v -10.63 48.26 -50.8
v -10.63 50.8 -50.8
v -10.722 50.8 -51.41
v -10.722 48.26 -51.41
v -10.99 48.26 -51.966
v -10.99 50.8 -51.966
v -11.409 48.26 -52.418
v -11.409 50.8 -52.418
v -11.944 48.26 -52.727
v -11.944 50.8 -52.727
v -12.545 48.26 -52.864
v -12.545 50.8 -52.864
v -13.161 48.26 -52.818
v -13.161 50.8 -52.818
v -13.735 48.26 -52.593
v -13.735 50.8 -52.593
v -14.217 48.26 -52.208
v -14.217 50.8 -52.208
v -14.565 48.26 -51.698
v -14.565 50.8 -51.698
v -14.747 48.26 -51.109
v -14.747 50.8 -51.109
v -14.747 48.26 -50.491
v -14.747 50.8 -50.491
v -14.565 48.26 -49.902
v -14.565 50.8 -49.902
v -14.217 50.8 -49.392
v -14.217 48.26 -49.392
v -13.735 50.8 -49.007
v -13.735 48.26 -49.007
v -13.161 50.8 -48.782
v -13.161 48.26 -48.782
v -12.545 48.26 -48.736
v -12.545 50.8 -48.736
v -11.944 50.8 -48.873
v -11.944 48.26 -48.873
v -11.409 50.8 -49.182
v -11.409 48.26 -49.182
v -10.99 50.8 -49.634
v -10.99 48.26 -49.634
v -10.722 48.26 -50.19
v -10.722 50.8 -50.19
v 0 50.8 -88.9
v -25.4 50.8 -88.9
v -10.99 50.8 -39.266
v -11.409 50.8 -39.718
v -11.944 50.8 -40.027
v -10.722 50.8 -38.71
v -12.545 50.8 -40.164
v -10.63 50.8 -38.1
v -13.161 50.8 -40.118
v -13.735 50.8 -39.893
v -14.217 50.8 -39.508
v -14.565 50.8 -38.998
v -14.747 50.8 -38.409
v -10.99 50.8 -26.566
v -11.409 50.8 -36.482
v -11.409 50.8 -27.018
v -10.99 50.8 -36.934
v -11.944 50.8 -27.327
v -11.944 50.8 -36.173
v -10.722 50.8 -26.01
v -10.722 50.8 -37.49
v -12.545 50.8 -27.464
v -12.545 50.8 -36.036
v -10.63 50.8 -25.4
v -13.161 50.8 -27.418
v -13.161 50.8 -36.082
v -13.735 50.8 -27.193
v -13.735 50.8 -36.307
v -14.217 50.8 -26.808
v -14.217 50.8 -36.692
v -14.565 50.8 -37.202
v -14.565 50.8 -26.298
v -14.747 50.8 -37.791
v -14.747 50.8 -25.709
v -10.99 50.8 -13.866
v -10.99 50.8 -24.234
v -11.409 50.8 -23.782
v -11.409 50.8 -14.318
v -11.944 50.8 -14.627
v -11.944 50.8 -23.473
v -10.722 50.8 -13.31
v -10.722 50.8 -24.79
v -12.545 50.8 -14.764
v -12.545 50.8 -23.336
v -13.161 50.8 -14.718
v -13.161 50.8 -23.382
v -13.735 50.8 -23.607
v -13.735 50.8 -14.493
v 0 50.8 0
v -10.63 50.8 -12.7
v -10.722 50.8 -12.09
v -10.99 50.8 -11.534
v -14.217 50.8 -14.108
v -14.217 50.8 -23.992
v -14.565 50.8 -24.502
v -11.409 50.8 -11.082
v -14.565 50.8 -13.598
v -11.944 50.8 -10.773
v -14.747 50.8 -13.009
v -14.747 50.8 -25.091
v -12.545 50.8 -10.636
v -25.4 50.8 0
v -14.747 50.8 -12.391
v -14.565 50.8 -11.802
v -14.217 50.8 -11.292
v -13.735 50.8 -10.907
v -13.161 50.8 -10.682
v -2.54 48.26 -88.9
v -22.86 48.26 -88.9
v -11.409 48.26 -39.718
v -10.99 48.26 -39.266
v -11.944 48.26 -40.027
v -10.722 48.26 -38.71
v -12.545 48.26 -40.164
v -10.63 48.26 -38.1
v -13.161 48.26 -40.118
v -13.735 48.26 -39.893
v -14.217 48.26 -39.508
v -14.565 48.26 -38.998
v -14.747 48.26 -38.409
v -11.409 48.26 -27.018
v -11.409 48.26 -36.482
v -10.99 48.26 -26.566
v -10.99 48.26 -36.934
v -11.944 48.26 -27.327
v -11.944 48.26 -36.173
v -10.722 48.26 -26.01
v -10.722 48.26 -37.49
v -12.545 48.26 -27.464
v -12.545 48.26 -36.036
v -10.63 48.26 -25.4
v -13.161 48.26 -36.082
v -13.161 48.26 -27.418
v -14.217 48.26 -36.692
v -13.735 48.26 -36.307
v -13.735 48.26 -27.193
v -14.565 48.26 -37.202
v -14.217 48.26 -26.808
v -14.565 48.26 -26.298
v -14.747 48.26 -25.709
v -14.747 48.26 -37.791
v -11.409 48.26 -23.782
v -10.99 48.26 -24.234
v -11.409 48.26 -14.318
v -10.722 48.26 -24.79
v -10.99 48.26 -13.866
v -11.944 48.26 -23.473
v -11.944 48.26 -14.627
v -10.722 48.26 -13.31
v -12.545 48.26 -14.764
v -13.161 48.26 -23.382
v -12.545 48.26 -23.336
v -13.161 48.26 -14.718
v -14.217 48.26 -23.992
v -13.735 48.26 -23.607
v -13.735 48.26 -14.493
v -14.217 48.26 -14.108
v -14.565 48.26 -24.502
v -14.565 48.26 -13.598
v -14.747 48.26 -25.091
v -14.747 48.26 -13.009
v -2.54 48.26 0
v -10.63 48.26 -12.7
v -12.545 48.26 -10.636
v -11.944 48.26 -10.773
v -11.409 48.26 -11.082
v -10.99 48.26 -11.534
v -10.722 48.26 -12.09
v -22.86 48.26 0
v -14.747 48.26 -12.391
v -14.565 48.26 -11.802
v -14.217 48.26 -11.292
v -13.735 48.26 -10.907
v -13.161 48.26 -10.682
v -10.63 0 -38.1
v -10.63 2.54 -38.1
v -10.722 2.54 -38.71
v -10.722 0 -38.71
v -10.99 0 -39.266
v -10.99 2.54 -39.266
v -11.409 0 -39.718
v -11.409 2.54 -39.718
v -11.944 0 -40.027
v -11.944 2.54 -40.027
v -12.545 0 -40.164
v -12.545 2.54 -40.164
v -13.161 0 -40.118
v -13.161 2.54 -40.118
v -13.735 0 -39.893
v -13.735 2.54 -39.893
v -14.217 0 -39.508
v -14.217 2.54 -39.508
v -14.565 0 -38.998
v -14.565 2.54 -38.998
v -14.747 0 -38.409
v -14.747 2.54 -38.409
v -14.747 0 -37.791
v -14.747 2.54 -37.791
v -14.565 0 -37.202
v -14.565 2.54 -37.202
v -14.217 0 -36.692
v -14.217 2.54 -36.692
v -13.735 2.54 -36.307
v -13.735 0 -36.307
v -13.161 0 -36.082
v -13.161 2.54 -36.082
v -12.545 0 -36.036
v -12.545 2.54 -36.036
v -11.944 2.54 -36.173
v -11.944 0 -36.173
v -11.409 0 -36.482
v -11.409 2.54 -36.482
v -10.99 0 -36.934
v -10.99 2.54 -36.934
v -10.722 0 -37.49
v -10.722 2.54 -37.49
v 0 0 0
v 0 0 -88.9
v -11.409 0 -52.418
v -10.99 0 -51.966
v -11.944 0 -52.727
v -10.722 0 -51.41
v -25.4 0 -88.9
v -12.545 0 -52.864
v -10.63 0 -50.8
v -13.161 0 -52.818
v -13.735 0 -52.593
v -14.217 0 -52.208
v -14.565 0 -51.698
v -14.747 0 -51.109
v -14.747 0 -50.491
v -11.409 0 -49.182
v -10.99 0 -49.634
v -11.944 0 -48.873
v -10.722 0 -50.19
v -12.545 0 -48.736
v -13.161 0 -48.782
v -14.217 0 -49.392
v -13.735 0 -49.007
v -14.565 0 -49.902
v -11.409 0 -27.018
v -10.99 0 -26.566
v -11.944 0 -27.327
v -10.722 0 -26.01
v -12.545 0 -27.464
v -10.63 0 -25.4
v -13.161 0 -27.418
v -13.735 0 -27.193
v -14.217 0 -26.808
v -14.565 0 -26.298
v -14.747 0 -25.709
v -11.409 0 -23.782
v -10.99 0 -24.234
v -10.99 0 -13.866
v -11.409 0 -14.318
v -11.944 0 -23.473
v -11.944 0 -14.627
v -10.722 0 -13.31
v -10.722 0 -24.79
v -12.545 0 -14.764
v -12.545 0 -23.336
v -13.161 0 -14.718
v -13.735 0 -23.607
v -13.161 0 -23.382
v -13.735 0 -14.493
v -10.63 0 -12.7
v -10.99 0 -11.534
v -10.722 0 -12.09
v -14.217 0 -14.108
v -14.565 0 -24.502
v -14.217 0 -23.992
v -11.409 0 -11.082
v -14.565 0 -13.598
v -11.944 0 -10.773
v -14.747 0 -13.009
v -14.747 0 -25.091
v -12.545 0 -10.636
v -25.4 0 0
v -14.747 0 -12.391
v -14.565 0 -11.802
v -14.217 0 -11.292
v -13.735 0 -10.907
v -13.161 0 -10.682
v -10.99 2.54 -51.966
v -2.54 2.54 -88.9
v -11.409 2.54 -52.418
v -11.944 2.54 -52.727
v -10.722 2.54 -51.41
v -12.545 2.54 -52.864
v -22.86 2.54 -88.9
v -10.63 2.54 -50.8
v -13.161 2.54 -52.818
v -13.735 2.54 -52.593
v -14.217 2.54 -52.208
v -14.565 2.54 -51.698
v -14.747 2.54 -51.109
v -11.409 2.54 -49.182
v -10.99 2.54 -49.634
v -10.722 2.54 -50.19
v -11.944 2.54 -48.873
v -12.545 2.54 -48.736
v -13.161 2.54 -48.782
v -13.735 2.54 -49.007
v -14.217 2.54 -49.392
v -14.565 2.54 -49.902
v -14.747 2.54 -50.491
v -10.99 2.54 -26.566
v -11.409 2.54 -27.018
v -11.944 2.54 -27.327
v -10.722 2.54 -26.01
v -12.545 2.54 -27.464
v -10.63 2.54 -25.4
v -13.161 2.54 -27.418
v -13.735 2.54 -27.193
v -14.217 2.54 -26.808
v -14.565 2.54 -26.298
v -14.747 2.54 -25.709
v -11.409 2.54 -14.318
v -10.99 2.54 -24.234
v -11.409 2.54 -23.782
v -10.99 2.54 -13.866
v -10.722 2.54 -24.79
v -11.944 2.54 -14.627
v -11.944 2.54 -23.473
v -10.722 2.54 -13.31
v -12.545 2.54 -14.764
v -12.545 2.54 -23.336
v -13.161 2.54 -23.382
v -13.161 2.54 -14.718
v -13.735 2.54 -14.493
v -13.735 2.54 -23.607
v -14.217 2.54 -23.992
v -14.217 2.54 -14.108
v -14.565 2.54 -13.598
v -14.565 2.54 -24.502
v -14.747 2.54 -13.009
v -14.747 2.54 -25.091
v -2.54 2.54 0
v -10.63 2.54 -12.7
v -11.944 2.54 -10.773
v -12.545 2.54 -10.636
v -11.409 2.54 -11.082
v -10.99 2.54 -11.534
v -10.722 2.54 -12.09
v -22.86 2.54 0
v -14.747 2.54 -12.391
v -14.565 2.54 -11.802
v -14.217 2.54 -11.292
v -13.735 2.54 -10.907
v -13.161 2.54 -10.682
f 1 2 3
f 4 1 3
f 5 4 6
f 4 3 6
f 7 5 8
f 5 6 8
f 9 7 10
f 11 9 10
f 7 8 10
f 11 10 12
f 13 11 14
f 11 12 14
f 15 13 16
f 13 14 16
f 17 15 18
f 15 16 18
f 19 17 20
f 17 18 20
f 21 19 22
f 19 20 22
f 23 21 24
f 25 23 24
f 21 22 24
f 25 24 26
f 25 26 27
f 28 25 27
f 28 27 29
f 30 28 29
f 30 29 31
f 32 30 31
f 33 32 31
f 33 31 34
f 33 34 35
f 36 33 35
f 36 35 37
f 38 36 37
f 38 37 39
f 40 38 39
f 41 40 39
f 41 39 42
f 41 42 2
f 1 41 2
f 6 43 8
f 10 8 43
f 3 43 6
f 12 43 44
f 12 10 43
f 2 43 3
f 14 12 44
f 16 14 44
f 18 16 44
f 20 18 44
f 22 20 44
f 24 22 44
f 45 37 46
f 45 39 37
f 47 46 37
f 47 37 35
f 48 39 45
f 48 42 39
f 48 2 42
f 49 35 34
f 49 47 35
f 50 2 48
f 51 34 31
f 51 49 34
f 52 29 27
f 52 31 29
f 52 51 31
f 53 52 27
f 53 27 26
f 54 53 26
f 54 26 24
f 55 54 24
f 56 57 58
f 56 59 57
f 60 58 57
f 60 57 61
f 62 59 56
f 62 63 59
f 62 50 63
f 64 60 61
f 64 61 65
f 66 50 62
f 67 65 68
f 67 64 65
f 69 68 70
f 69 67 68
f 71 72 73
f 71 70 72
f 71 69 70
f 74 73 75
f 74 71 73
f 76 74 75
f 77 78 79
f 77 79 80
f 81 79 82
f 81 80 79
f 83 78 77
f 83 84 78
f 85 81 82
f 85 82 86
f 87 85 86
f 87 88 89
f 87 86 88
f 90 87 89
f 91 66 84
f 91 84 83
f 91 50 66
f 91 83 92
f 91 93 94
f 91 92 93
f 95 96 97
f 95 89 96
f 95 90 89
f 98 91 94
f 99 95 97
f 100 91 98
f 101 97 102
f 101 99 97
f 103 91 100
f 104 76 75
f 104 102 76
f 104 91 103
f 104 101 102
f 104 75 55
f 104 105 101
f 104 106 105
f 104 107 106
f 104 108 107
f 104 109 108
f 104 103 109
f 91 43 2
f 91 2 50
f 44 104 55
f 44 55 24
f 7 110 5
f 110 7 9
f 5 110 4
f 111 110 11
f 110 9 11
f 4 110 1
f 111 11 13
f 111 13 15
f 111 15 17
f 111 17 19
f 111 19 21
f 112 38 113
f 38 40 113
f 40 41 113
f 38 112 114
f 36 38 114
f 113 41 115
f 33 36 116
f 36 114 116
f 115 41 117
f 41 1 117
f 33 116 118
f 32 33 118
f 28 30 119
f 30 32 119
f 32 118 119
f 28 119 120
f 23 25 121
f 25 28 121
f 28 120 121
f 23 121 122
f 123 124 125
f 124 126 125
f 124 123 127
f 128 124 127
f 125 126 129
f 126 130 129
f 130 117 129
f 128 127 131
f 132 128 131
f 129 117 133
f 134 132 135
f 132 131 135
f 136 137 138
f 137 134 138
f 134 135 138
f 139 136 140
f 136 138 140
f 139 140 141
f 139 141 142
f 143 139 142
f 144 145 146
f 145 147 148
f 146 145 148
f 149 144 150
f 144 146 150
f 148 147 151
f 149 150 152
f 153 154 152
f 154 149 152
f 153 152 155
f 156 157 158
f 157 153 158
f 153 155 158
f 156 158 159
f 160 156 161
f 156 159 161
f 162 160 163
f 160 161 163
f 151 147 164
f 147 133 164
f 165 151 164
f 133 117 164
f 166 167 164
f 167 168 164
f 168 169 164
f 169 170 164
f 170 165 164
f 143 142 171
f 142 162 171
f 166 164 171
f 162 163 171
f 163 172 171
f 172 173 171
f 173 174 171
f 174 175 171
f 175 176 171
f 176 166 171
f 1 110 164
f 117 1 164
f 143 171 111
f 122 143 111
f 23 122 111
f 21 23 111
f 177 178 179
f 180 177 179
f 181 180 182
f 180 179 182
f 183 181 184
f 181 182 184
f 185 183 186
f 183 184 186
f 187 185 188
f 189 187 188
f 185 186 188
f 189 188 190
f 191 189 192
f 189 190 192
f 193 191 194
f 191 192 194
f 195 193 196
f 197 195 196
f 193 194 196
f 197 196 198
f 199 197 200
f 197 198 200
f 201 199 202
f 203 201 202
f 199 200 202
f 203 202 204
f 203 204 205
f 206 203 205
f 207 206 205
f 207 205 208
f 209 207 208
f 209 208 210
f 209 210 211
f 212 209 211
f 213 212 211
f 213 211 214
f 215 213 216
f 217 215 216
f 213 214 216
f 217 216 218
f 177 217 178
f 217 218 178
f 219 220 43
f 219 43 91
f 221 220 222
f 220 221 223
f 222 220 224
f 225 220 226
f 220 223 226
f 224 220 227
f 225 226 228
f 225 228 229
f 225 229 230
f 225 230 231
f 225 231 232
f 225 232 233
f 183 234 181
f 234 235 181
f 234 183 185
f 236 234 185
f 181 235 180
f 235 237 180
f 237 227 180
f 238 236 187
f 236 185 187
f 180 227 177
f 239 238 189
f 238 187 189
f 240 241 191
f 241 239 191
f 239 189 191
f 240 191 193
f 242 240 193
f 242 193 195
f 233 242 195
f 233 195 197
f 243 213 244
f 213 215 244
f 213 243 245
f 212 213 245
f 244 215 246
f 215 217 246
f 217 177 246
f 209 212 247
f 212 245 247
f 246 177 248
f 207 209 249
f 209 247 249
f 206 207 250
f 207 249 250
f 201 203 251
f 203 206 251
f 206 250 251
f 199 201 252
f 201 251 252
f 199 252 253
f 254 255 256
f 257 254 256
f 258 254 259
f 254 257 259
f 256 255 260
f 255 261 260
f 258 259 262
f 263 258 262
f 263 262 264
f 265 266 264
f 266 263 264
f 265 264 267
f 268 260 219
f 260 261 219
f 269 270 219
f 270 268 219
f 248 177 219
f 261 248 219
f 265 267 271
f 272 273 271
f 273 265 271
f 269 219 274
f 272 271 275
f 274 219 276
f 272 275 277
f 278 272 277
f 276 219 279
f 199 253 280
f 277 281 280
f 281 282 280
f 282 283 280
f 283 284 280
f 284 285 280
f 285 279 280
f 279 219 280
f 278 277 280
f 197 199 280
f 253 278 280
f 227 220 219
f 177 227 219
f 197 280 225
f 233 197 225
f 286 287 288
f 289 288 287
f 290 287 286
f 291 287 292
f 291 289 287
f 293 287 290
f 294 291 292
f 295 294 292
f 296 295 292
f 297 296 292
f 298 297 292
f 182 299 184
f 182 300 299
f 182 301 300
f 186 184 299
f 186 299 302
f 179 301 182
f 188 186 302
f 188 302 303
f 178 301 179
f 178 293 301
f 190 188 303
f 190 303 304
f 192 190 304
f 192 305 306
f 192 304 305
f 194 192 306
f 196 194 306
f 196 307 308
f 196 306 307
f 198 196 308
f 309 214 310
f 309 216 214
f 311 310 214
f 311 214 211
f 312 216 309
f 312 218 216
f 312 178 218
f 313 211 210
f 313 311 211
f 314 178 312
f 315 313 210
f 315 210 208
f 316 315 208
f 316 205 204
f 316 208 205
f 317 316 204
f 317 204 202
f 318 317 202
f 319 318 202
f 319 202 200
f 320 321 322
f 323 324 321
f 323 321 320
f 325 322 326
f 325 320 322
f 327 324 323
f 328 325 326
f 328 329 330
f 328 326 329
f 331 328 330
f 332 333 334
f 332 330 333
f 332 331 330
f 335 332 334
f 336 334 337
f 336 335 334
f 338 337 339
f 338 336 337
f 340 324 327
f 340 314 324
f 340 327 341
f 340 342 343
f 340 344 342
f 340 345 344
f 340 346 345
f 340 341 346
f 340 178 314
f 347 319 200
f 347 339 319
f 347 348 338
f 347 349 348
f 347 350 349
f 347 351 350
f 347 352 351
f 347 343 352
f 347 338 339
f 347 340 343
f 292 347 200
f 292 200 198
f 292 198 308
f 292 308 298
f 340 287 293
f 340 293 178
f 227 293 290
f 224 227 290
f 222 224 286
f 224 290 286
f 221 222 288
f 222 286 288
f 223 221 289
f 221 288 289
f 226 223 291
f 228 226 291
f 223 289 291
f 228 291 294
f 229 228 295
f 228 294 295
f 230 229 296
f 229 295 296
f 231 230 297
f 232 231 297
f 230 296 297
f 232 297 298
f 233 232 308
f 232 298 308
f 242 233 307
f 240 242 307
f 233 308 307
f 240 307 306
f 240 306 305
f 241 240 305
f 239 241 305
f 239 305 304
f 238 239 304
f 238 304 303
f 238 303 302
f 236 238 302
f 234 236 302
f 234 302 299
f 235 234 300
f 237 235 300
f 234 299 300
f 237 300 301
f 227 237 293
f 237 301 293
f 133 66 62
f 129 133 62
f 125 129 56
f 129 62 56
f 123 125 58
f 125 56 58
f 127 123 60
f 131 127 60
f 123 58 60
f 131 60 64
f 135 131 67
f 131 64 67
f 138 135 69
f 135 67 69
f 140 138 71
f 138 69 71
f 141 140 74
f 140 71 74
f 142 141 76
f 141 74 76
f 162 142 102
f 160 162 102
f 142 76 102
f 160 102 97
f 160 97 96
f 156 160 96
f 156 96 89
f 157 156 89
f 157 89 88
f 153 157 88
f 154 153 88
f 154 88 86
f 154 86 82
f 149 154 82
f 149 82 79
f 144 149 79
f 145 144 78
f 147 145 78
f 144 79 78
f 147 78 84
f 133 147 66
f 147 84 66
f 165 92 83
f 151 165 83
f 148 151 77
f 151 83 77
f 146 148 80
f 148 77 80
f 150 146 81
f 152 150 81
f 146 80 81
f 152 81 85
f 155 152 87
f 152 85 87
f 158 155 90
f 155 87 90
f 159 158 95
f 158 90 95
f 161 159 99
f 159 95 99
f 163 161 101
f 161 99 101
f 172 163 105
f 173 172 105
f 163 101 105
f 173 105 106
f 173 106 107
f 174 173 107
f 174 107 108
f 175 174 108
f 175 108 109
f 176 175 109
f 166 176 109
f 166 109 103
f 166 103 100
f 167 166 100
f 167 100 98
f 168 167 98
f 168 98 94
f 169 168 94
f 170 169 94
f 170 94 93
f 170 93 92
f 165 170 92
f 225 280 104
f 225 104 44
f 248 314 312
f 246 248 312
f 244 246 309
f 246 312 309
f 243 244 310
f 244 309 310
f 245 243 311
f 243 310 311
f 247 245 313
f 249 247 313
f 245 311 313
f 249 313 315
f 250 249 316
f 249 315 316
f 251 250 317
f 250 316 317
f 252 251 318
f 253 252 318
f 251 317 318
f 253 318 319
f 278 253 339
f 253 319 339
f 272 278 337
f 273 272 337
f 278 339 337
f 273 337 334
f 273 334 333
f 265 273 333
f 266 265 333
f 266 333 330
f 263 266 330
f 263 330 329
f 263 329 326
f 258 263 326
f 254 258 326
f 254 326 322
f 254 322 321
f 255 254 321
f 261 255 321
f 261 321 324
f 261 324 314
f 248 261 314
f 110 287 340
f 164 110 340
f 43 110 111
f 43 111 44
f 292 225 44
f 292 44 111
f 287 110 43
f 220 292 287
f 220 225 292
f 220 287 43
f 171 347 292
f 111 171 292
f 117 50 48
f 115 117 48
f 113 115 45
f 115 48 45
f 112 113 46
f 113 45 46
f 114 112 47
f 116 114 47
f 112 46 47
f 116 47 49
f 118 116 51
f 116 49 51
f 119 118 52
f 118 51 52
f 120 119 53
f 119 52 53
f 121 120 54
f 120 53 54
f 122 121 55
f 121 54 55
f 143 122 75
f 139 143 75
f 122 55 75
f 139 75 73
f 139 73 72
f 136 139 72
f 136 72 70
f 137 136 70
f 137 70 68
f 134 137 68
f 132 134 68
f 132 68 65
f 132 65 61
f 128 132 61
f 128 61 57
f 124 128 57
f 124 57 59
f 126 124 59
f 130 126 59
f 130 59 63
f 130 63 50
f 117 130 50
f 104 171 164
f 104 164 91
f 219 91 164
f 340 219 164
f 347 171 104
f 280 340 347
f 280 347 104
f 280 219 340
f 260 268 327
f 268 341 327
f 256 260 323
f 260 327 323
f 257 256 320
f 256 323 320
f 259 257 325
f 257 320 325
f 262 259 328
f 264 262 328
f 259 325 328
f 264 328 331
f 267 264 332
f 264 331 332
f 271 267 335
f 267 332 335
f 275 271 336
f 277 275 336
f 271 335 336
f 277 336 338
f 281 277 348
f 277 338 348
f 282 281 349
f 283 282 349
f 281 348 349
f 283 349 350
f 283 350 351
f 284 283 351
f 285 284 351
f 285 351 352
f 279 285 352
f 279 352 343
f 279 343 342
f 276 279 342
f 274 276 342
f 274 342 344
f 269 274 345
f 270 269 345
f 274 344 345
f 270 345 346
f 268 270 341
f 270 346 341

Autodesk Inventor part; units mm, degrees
ref_plane "YZ Plane" through (0, 0, 0) normal (1, 0, 0) x (0, 1, 0)
ref_plane "XZ Plane" through (0, 0, 0) normal (0, 1, 0) x (-1, 0, 0)
ref_plane "XY Plane" through (0, 0, 0) normal (0, 0, 1) x (1, 0, 0)
sketch "Sketch1" plane through (0, 0, 0) normal (0, 1, 0) x (-1, 0, 0)
  line L0 (0, 0) -> (25.4, 0)
  line L1 (25.4, 0) -> (25.4, -88.9)
  line L2 (25.4, -88.9) -> (0, -88.9)
  line L3 (0, -88.9) -> (0, 0)
  dimension "d0" = 88.9
  dimension "d1" = 25.4
extrude "Extrusion1" add sketch "Sketch1" along normal blind 50.8
shell "Shell1" thickness 2.54 removed faces 2 at (-16.9333, 33.8667, 0) at (-8.4667, 16.9333, -88.9)
sketch "Sketch2" plane through (0, 50.8, 0) normal (0, 1, 0) x (1, 0, 0)
  line L0 (-2.54, 0) -> (-22.86, 0) construction
  line L1 (-12.7, 0) -> (-12.7, 62.6675) construction
  circle A0 centre (-12.7, 0) radius 2.0701
  circle A1 centre (-12.7, 12.7) radius 2.0701
  circle A2 centre (-12.7, 25.4) radius 2.0701
  circle A3 centre (-12.7, 38.1) radius 2.0701
  circle A4 centre (-12.7, 50.8) radius 2.0701
  point P0 (0, 0)
  dimension "d5" = 4.1402
  dimension "d8" = 12.7
extrude "Extrusion2" cut sketch "Sketch2" against normal through all contours A1 | A2 | A3 | A4
